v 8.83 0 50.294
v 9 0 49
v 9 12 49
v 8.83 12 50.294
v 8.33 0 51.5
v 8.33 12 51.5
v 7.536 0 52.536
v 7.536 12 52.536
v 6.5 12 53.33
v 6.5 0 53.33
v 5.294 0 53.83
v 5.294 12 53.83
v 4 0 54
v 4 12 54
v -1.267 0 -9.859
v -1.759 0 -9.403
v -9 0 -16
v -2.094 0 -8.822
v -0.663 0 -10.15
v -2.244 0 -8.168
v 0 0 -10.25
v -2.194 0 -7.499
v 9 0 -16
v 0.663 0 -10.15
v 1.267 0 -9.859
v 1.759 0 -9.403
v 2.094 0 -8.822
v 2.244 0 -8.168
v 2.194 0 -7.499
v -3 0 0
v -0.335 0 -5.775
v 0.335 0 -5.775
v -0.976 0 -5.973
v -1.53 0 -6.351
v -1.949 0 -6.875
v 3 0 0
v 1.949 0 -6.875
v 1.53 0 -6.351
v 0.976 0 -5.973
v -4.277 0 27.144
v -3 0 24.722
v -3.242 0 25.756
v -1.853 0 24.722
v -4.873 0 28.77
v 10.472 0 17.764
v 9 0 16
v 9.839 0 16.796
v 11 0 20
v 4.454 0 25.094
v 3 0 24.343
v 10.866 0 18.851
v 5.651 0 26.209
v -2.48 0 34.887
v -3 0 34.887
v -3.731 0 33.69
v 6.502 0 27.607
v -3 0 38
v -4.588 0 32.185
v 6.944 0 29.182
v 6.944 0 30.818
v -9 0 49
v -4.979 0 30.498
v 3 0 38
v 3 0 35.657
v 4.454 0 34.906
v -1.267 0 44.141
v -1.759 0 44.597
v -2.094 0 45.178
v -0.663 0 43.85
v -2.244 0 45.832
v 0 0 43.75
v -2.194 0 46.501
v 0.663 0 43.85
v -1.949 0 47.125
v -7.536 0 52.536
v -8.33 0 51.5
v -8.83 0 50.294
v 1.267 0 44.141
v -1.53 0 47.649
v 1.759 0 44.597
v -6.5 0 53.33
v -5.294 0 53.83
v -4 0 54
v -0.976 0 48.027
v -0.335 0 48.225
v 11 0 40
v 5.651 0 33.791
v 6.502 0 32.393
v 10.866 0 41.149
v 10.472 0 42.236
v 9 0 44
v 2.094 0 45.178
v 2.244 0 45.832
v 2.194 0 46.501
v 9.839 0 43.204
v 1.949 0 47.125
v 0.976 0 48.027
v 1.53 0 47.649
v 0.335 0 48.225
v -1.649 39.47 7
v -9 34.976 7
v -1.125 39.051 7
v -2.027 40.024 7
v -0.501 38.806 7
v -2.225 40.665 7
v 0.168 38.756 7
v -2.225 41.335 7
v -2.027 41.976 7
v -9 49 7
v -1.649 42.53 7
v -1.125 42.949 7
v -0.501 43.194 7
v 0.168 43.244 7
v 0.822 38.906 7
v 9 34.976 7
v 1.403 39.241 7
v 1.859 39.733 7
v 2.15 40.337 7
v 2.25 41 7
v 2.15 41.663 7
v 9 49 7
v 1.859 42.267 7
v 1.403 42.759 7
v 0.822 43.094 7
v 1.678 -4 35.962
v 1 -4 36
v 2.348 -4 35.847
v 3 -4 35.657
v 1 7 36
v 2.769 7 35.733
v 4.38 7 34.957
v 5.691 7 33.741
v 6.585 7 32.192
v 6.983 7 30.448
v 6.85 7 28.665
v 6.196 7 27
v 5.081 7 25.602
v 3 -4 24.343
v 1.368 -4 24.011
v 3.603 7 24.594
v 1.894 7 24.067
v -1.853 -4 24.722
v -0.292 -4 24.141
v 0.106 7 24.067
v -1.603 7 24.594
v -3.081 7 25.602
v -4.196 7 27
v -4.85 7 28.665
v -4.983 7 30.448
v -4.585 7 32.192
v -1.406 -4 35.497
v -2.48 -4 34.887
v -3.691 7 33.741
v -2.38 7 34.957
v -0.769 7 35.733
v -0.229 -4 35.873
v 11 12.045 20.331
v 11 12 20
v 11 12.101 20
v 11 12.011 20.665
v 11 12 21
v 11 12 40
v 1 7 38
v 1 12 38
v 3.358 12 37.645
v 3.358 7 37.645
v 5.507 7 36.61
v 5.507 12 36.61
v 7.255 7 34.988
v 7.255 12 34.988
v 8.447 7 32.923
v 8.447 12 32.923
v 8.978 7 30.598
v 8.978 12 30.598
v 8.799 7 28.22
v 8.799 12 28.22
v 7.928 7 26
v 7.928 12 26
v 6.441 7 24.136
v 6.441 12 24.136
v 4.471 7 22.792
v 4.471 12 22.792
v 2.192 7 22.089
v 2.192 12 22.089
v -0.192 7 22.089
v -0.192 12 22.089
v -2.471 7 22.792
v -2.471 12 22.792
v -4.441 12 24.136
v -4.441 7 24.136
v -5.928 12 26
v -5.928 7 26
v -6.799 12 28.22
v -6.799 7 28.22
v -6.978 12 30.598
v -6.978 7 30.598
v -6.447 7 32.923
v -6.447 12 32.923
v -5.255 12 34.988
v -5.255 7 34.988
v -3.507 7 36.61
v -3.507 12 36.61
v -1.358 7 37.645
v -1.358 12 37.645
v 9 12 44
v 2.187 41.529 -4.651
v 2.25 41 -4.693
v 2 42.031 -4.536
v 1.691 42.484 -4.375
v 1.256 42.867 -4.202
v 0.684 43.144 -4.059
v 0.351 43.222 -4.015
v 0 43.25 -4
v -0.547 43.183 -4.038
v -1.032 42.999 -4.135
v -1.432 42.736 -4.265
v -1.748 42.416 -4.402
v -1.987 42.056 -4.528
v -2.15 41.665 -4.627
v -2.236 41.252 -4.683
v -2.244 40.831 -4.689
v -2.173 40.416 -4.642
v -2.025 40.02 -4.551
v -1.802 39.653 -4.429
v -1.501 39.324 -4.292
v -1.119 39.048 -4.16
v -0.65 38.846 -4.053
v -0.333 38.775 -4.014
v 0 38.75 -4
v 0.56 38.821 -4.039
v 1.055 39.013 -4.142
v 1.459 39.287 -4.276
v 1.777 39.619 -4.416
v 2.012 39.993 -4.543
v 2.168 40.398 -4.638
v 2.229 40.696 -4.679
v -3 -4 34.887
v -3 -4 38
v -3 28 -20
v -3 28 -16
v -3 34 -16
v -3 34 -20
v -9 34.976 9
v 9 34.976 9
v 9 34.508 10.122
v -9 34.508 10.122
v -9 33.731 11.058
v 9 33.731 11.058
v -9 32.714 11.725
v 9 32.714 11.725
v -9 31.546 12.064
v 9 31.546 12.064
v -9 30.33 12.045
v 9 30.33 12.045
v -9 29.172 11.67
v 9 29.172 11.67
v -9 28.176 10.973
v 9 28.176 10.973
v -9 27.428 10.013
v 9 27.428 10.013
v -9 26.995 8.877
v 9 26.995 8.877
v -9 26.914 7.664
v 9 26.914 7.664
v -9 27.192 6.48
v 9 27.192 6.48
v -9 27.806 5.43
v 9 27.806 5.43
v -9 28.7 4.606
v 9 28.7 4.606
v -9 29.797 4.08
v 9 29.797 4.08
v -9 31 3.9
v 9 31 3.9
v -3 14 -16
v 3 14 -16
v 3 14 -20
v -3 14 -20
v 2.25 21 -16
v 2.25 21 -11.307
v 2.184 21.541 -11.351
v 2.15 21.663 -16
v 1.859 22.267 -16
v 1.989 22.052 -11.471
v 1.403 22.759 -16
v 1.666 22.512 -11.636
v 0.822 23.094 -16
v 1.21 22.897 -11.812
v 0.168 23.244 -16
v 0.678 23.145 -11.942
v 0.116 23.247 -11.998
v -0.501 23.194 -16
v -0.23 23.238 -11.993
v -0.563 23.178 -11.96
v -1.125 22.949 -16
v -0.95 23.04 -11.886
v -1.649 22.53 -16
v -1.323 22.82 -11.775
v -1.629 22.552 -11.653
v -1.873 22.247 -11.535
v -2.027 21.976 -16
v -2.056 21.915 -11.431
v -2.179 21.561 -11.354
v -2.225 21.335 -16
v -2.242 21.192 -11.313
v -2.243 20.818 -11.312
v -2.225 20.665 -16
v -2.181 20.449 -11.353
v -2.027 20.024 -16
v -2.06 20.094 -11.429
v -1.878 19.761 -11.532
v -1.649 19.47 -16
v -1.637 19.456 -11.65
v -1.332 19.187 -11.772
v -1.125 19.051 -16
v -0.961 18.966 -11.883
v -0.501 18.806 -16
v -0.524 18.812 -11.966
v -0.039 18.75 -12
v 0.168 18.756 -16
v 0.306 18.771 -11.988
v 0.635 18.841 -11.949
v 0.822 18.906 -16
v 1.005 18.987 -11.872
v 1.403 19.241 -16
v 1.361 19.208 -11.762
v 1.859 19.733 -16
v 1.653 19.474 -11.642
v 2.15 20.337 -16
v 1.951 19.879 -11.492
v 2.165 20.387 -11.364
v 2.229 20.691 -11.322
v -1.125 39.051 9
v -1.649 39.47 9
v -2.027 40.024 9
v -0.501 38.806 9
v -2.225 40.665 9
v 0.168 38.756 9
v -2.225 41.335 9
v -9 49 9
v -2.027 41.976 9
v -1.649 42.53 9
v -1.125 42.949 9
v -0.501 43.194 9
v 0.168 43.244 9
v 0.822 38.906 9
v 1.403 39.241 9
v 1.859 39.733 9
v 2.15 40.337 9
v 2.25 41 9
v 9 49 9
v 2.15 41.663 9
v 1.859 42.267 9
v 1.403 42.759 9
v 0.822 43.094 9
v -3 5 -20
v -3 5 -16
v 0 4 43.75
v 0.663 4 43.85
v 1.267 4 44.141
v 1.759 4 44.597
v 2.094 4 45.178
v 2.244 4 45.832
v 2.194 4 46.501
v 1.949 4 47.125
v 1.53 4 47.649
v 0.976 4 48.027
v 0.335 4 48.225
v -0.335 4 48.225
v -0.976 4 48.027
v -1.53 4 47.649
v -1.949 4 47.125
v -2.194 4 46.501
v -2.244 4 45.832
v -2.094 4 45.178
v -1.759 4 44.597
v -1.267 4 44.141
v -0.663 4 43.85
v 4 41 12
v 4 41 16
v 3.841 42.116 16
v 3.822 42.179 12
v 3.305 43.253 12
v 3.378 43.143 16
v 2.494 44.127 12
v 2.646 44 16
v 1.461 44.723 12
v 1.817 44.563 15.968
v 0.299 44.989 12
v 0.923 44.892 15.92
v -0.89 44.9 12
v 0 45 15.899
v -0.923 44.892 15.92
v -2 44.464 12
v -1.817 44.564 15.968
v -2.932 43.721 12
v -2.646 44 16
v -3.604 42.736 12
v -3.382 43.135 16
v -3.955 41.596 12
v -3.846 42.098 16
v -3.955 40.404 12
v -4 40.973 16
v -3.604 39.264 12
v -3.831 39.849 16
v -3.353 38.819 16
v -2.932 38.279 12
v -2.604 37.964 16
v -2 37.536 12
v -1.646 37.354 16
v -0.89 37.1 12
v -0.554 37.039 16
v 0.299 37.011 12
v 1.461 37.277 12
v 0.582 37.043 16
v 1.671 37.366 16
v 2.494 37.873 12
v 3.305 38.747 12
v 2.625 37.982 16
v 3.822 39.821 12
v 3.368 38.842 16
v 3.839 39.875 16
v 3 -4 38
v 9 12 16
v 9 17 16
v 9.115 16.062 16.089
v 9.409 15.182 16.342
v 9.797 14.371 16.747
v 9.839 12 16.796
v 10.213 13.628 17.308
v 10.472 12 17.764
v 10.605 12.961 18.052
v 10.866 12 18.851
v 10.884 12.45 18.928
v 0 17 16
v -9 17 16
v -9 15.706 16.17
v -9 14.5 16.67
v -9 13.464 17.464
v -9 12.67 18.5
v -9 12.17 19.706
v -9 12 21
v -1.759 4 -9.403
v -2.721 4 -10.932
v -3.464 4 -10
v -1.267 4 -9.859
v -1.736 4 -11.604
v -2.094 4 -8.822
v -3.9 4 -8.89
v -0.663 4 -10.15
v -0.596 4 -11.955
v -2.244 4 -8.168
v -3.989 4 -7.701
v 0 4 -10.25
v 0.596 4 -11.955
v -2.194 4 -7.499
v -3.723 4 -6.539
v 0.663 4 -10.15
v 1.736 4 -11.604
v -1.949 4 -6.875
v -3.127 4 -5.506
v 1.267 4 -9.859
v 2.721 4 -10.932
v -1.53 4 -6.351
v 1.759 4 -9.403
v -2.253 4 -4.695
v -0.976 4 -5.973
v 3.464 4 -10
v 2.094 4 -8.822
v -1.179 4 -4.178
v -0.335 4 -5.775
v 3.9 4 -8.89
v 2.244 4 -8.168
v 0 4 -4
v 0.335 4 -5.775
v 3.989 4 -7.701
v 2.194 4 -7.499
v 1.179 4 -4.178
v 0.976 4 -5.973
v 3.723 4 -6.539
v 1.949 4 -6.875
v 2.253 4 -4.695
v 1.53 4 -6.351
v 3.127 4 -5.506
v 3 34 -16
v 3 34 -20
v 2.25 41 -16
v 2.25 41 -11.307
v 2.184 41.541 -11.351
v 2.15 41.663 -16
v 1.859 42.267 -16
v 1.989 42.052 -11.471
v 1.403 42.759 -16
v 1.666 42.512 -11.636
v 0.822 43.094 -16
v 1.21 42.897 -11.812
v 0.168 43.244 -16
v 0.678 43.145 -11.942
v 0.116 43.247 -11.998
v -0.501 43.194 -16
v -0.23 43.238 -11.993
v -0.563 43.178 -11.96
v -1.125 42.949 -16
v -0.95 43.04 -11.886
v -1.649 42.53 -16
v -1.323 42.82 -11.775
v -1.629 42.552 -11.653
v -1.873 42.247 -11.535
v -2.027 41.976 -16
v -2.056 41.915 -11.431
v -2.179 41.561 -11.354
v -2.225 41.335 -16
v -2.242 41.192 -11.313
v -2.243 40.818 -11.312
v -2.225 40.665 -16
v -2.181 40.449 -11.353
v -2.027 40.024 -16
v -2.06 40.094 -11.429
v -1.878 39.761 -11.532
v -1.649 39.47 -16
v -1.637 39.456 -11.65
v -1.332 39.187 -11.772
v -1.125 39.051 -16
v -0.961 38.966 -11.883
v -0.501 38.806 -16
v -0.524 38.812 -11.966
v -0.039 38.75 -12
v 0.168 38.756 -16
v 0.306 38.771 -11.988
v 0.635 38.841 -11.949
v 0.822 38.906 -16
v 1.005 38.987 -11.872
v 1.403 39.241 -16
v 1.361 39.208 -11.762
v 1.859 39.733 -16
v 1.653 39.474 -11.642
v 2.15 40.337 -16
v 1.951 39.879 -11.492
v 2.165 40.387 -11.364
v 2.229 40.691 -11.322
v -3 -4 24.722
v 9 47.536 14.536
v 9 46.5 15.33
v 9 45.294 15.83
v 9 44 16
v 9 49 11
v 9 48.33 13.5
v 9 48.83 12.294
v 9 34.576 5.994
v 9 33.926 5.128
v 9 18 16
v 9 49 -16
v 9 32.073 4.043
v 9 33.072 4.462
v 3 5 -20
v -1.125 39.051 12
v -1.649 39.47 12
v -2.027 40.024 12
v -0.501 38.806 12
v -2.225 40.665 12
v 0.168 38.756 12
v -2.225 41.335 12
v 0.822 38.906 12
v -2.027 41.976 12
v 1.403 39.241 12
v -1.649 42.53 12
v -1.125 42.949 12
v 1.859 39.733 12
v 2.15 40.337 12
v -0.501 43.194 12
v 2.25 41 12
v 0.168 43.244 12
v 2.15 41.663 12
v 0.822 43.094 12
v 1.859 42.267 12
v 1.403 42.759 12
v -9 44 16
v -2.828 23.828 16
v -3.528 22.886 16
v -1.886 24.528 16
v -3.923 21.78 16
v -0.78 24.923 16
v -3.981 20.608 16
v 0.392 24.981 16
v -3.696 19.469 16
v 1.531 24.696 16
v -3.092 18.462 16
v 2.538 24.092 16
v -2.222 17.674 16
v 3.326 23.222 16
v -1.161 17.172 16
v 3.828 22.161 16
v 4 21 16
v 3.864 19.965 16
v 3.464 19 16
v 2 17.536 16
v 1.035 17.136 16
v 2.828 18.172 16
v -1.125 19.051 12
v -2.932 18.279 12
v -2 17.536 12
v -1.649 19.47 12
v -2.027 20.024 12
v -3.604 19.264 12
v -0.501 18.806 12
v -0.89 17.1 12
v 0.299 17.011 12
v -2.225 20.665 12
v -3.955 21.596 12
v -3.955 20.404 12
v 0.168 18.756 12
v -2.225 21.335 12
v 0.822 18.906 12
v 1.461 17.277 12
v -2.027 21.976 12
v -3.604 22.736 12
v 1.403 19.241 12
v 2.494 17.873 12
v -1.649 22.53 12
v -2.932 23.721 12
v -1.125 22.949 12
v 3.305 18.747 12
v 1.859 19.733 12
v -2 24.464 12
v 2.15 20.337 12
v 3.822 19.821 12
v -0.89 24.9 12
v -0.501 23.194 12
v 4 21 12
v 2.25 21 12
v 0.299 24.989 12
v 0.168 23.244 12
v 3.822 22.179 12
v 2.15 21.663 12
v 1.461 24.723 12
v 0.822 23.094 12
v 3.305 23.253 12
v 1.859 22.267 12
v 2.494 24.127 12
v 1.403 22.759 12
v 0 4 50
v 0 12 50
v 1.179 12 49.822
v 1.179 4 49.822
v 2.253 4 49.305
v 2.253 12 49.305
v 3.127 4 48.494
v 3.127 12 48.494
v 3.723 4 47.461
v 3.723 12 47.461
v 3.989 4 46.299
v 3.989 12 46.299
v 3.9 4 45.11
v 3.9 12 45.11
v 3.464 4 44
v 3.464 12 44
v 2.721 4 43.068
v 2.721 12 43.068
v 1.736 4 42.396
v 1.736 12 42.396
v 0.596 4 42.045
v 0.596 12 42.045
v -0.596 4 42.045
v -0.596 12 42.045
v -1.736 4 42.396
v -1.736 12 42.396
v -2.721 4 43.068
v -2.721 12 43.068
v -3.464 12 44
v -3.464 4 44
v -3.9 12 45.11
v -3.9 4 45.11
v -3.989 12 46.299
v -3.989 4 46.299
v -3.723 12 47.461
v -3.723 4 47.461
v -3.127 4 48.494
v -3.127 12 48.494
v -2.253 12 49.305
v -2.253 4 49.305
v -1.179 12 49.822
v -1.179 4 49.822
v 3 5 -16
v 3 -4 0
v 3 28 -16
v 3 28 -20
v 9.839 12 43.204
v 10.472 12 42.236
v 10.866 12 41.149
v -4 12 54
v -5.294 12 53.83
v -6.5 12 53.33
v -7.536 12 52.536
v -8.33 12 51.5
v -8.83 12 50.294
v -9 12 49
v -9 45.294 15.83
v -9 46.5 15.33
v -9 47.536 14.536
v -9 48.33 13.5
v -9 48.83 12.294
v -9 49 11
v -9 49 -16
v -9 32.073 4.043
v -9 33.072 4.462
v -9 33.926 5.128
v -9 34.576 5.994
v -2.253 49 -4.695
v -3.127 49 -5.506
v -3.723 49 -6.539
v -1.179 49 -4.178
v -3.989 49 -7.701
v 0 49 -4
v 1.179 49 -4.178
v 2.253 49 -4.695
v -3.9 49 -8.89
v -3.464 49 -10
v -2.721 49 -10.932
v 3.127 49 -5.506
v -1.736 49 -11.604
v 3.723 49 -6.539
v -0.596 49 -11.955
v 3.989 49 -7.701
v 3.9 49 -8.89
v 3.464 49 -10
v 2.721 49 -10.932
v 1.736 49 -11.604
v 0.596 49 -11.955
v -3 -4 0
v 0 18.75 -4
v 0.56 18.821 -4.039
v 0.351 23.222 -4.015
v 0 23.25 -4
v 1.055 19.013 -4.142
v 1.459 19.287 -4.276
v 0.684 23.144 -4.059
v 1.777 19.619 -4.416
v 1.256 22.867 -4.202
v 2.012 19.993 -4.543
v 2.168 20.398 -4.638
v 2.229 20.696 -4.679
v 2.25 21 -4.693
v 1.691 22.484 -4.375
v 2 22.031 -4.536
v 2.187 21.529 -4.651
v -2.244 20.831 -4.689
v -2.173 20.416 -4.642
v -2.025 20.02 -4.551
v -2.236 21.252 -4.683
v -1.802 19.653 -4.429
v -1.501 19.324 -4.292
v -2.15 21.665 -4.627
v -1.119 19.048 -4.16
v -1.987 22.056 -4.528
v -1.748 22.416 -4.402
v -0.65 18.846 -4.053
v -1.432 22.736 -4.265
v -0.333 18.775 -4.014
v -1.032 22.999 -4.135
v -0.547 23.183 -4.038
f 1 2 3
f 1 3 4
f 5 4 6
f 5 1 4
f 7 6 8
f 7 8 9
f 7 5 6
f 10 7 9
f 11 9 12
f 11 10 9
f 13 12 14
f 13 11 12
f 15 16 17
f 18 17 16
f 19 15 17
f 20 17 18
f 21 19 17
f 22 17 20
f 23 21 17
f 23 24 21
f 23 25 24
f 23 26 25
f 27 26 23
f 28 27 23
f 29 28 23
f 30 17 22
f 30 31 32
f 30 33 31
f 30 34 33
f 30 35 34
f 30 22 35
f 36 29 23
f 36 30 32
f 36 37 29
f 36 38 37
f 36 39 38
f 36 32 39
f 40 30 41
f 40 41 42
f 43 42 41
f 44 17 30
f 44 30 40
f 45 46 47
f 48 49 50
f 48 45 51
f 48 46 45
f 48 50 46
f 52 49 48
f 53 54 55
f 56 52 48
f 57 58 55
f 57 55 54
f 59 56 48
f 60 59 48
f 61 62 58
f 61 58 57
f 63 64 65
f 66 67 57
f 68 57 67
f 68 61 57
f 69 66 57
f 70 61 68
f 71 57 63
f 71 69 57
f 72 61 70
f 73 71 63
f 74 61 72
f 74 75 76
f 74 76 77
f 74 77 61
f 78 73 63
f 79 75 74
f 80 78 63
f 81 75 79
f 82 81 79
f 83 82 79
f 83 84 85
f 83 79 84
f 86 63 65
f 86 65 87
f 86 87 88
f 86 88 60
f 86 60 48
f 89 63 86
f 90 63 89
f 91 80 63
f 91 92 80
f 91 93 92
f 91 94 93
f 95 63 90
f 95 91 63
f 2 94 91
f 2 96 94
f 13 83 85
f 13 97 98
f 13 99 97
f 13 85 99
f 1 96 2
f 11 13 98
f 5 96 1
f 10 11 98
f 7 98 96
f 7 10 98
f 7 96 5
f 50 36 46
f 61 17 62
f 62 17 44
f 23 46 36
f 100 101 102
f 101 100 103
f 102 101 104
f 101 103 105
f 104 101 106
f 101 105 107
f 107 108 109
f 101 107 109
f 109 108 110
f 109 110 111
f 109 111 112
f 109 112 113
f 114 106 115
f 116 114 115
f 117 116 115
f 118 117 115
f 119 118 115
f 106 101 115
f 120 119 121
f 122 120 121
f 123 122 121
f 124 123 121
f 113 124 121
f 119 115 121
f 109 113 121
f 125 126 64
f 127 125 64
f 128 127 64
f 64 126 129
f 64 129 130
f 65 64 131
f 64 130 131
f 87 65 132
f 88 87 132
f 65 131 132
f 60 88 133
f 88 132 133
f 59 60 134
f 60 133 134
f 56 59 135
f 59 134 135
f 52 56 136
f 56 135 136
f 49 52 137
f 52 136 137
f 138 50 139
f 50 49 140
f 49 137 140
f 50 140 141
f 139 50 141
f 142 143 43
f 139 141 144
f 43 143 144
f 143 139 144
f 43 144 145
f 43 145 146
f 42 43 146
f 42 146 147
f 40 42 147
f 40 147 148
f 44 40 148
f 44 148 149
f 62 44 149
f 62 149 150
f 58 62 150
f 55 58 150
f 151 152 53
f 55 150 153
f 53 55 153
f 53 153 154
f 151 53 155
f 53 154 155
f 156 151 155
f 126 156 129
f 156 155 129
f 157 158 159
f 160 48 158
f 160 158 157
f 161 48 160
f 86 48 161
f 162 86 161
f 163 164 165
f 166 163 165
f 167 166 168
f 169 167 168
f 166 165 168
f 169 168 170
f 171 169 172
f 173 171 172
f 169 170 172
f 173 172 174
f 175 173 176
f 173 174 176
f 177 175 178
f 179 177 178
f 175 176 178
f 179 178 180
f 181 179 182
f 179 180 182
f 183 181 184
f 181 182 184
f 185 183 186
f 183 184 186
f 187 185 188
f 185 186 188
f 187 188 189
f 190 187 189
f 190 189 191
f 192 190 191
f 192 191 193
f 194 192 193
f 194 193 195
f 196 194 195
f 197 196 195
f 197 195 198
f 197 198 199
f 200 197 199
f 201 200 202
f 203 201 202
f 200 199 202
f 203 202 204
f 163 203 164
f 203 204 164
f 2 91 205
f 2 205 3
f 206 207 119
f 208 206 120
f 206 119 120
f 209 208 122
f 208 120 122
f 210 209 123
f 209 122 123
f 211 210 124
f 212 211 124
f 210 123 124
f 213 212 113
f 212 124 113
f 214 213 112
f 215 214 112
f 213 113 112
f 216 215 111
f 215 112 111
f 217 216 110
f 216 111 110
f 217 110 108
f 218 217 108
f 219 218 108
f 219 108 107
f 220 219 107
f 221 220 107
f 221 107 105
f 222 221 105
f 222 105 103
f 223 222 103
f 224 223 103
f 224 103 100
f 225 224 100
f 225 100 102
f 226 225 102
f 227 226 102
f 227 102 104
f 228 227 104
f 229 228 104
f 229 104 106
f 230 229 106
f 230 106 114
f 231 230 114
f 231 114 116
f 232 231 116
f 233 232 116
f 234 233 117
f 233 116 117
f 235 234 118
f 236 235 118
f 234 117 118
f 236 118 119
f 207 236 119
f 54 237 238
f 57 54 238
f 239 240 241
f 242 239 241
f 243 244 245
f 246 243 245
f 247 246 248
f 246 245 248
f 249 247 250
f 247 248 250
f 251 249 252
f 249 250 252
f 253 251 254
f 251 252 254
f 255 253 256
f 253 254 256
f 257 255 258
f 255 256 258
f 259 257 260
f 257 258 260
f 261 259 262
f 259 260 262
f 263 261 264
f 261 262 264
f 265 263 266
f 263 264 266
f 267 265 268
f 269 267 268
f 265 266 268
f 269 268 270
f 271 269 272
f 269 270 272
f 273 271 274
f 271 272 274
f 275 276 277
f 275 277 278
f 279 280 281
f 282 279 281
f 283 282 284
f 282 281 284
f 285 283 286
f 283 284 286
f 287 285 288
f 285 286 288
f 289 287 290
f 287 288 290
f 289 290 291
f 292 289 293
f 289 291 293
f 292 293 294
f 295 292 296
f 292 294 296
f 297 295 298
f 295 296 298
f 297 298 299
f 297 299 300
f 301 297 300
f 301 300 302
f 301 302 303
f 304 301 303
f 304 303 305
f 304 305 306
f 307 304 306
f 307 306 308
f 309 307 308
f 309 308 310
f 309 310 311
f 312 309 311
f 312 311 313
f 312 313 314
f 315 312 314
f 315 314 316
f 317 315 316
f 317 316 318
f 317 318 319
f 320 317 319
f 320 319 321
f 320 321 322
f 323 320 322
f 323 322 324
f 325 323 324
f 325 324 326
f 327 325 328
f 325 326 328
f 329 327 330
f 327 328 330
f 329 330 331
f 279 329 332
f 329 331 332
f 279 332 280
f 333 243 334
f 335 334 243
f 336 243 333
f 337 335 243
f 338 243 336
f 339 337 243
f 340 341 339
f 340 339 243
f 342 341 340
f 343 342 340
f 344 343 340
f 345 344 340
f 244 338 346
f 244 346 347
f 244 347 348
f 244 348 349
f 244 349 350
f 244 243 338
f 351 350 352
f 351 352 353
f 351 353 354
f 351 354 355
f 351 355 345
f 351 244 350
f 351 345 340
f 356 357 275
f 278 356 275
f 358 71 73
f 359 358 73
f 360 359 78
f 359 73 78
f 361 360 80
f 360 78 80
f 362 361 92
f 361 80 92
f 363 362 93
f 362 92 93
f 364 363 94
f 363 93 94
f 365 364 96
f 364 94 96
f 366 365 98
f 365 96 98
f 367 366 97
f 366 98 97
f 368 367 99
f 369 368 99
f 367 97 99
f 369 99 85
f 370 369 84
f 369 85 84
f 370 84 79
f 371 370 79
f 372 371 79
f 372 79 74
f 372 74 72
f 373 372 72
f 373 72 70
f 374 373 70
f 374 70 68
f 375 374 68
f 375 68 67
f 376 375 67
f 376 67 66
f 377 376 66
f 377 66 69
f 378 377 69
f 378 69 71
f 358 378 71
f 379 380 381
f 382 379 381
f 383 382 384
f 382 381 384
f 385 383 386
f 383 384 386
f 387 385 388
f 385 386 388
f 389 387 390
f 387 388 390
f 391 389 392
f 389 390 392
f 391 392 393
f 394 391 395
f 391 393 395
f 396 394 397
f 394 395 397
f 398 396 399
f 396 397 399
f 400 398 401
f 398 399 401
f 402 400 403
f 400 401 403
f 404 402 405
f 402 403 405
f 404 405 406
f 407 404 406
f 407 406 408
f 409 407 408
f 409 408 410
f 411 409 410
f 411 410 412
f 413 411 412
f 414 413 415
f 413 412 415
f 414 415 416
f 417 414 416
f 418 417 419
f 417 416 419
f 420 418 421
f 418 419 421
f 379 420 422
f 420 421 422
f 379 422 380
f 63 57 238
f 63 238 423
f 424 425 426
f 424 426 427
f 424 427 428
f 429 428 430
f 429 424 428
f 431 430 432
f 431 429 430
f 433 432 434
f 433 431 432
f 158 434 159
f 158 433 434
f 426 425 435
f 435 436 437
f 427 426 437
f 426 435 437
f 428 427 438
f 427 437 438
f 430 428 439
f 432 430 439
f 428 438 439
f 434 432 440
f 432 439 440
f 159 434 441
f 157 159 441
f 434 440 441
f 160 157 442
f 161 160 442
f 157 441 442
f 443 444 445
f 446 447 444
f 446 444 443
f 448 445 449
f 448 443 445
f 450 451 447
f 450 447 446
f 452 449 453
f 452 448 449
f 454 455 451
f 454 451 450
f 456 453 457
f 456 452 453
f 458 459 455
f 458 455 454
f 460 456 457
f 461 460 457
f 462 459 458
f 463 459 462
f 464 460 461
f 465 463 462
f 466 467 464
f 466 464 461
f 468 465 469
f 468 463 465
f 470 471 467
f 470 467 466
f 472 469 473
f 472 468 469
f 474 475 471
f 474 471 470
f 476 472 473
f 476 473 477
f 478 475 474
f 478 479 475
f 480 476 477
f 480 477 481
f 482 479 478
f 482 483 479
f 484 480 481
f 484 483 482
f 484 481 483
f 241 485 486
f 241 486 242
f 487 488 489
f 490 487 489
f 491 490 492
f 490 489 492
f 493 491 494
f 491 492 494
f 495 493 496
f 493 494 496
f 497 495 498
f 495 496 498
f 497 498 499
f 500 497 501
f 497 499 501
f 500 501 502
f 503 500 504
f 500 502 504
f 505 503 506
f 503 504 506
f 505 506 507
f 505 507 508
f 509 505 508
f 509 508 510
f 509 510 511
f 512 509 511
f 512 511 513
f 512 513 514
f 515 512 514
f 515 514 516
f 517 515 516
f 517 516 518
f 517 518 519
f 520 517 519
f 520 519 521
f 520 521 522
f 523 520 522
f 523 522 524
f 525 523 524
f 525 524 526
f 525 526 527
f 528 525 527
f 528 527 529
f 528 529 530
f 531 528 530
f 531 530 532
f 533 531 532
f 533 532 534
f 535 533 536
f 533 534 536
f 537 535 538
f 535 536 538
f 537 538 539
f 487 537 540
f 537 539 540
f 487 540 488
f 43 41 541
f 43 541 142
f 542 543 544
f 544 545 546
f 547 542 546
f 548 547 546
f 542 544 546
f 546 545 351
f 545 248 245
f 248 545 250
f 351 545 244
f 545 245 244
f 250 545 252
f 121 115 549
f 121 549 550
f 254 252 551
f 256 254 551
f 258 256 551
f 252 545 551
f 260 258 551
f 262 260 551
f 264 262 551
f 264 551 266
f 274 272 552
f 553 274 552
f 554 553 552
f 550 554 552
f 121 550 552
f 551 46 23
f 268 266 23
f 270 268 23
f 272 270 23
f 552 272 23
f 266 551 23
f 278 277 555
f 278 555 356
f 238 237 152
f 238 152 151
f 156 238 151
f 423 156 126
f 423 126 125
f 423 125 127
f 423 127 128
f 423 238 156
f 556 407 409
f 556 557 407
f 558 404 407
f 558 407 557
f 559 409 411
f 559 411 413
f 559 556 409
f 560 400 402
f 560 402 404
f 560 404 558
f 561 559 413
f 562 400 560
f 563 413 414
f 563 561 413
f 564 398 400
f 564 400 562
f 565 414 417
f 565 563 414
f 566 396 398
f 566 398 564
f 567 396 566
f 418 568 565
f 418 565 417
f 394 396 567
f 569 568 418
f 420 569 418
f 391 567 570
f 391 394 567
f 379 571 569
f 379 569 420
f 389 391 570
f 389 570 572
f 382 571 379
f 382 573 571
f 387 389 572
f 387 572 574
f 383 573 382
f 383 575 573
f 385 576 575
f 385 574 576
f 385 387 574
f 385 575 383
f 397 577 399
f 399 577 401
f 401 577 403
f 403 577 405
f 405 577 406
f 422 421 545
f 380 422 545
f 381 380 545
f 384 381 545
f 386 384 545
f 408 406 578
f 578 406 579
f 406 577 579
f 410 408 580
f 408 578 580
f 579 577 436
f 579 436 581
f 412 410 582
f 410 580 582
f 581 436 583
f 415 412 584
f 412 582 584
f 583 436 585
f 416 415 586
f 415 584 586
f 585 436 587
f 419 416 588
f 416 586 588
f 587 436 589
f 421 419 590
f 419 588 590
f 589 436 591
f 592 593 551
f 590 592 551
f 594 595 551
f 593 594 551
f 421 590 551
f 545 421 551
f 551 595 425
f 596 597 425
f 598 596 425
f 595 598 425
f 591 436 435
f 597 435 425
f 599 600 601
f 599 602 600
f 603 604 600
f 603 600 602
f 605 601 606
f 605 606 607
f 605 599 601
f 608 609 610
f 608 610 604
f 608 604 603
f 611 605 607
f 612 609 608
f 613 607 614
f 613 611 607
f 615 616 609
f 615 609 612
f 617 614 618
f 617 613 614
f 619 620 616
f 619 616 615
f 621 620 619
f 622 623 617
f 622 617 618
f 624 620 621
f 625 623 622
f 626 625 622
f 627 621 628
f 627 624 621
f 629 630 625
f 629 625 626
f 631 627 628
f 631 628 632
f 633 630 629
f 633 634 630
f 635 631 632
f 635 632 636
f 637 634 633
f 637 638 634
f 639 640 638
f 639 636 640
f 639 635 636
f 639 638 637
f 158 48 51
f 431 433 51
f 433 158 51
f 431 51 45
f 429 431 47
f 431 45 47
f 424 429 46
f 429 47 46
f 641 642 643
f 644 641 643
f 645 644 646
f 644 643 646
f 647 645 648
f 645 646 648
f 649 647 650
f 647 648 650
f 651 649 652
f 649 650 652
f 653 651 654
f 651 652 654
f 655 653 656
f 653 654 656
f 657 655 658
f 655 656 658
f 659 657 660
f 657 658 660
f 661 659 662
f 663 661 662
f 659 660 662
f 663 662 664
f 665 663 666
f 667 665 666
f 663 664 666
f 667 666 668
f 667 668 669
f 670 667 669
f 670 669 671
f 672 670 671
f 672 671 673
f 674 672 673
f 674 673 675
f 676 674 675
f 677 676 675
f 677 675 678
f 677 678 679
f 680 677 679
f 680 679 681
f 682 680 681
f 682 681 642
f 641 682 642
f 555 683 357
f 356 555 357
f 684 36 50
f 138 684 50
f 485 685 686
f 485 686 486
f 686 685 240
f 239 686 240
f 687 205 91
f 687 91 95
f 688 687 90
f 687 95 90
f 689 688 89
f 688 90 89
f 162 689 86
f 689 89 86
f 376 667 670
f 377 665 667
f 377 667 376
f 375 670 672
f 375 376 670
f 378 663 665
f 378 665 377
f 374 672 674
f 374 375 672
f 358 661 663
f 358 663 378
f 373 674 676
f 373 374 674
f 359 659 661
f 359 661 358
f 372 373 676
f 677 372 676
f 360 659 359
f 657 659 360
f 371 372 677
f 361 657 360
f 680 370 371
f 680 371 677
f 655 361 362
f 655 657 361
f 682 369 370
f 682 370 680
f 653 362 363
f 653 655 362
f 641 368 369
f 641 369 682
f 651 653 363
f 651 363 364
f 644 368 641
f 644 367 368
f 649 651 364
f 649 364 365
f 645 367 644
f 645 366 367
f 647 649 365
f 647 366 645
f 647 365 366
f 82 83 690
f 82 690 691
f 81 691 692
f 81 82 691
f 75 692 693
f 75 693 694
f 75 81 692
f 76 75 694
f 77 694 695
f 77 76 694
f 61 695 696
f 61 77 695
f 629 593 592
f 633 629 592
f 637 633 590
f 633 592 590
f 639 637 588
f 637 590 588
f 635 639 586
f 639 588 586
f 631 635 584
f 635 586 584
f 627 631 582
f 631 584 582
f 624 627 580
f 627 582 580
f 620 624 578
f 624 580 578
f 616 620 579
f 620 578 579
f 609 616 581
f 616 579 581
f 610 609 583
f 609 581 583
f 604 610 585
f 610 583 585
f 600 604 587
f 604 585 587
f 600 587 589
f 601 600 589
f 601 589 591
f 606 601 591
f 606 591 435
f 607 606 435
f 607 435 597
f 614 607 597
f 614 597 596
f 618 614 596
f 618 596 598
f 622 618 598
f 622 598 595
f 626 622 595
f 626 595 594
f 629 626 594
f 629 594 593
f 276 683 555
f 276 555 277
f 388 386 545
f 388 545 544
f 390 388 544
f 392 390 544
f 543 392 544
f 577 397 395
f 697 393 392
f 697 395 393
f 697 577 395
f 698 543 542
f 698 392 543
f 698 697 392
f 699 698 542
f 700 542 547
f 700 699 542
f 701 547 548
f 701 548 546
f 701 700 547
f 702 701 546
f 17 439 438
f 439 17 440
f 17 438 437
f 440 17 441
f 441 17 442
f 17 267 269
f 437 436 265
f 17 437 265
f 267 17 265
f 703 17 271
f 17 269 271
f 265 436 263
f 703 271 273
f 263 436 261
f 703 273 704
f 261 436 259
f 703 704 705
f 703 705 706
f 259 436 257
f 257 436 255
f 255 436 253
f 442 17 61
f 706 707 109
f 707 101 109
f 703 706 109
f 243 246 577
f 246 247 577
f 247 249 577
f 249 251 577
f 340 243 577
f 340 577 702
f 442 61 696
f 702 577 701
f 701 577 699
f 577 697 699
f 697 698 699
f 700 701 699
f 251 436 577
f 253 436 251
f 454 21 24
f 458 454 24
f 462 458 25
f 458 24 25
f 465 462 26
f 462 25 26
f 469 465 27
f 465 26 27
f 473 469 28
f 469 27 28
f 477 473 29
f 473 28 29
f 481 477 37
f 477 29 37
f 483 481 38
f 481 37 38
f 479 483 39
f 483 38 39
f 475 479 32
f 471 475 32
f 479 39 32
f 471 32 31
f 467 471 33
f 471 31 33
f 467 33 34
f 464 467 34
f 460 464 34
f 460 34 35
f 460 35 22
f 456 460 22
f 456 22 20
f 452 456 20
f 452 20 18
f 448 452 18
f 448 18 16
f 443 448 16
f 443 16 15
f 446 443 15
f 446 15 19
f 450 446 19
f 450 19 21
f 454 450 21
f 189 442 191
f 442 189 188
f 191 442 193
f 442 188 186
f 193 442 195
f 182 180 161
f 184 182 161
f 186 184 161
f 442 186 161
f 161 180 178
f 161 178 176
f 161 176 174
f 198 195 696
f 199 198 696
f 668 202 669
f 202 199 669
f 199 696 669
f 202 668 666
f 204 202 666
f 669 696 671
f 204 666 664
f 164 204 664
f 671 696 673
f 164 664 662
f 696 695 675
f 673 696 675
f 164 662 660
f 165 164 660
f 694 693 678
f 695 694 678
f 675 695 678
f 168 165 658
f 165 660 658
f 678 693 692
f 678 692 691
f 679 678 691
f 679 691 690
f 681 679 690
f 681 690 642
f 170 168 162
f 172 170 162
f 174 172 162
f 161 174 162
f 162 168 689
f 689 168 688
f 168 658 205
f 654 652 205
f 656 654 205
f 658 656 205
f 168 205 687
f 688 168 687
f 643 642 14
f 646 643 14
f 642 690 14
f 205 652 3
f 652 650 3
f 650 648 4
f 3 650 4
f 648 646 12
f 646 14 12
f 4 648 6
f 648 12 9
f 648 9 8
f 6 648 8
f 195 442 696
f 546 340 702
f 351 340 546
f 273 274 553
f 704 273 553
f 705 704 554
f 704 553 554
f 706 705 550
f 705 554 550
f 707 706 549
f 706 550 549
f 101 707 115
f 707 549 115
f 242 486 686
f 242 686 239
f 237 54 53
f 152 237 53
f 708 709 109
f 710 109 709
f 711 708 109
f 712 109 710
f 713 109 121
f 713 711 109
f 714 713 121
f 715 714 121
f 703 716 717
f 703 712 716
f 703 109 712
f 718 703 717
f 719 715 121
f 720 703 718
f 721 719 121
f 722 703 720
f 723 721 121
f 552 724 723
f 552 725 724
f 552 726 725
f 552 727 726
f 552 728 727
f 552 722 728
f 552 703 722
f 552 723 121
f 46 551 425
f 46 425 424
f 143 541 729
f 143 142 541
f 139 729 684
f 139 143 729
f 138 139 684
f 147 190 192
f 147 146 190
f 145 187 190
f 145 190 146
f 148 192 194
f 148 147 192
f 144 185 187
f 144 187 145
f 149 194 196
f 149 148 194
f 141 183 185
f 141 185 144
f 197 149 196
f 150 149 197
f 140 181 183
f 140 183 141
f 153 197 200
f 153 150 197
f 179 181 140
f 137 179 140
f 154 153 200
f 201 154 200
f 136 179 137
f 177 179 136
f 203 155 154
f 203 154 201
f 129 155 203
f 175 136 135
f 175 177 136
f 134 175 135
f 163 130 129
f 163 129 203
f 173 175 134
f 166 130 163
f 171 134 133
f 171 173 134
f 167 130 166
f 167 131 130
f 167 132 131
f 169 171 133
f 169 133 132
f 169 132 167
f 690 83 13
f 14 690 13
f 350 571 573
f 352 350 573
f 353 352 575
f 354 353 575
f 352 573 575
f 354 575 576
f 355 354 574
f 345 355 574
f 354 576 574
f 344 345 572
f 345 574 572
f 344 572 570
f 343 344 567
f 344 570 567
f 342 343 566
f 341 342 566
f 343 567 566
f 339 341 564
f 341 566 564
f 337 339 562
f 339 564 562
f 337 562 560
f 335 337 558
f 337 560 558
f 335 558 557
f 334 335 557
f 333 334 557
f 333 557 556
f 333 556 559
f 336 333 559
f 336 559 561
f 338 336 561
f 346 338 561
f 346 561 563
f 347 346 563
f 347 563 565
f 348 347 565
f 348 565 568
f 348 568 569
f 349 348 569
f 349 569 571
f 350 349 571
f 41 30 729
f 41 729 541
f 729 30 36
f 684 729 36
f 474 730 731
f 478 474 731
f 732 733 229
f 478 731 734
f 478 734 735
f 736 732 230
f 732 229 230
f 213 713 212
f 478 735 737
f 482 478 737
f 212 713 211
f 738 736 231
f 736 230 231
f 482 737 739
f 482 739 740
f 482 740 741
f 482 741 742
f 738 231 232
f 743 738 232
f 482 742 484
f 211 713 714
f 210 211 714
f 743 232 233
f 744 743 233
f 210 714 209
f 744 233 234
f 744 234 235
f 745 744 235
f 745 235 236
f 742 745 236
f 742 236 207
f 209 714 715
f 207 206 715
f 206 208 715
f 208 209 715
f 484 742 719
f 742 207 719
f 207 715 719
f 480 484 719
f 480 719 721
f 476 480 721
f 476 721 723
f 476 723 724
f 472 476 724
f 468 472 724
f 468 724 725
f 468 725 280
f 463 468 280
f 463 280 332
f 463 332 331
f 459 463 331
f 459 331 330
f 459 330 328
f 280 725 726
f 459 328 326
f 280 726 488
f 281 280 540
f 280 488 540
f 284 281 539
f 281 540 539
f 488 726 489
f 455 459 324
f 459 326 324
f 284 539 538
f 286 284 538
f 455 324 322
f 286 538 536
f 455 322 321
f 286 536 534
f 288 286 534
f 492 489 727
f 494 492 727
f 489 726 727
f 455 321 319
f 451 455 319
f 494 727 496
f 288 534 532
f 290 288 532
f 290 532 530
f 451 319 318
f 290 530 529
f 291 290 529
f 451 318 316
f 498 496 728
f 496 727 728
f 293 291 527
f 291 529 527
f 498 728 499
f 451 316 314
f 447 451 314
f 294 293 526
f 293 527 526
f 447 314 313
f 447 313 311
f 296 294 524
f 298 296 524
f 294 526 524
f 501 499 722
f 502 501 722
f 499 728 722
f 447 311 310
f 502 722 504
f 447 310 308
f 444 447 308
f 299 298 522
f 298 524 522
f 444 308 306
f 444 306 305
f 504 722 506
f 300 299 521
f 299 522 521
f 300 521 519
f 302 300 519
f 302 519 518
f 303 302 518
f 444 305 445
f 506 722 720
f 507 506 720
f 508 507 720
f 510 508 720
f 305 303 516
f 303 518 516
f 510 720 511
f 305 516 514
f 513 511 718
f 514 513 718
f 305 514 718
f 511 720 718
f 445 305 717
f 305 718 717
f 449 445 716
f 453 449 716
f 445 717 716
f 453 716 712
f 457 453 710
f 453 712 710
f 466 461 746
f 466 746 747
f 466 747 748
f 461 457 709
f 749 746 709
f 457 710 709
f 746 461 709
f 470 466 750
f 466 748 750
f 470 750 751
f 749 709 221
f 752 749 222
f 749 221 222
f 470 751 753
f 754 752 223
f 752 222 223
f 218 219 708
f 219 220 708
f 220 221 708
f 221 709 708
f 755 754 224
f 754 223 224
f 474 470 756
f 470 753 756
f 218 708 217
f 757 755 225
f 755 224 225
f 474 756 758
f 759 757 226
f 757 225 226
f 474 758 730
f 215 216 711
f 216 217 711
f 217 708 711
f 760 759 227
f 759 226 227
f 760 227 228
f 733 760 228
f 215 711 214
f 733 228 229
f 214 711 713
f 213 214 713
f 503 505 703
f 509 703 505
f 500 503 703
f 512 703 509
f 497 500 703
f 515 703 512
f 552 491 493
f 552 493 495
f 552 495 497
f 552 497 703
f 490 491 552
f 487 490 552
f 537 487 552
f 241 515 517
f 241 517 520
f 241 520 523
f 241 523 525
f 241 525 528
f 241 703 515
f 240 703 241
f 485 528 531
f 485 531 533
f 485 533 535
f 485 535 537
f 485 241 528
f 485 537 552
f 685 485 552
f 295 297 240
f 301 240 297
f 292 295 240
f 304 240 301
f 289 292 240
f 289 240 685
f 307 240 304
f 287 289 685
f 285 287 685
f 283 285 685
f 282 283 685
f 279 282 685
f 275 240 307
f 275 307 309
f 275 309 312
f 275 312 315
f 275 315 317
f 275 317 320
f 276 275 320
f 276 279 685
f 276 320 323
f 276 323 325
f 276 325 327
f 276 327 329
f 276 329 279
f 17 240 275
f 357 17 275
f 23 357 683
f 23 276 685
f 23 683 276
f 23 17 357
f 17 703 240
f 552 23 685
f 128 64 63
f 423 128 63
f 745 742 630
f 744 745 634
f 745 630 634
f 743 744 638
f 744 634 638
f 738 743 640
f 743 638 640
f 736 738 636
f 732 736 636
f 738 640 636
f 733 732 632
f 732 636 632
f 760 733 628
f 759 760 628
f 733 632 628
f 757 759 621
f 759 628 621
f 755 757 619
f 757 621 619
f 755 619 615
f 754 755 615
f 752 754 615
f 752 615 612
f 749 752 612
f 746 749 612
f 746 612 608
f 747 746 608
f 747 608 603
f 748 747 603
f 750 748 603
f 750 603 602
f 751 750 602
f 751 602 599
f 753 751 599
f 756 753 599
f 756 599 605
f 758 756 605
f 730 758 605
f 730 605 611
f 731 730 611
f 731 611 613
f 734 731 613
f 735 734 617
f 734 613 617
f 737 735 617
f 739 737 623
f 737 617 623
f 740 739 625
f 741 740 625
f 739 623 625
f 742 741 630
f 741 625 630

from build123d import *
from build123d.topology import SkipClean

# Parameters (mm, degrees)
SKETCH_2_W          = 18
SKETCH_2_H          = 32
EXTRUDE_1_DEPTH     = 49
SKETCH_3_R          = 4.1
CUT_EXTRUDE_1_DEPTH = 27.3
SKETCH_16_W         = 20
SKETCH_16_H         = 28
EXTRUDE_3_DEPTH     = 12
SKETCH_17_R         = 2.25
CUT_EXTRUDE_3_DEPTH = 66
SKETCH_18_W         = 6
SKETCH_18_H         = 9
SKETCH_18_H_2       = 6
EXTRUDE_4_DEPTH     = 4
SKETCH_19_R         = 4
CUT_EXTRUDE_4_DEPTH = 4
SKETCH_23_W         = 18
SKETCH_23_H         = 10
EXTRUDE_5_DEPTH     = 12
SKETCH_4_R          = 2.25
CUT_EXTRUDE_2_DEPTH = 74.742796258
SKETCH_20_R         = 8
SKETCH_20_R_2       = 6
CUT_EXTRUDE_5_DEPTH = 5
SKETCH_8_W          = 6
SKETCH_8_H          = 3.112620607
SKETCH_8_H_2        = 24.721686793
EXTRUDE_7_DEPTH     = 4
SKETCH_20_4_R       = 6
CUT_EXTRUDE_7_DEPTH = 25
FILLET_1_R          = 5
FILLET_START        = -1
FILLET_2_DEPTH      = 13
FILLET_START_2      = -9
FILLET_2_2_DEPTH    = 18.34805991
FILLET_2_3_DEPTH    = 20
FILLET_2_4_DEPTH    = 19
SKETCH_24_W         = 2
SKETCH_24_H         = 18
CUT_EXTRUDE_8_DEPTH = 23
SKETCH_25_R         = 4
CUT_EXTRUDE_9_DEPTH = 45


with BuildPart() as part:
    # Эскиз2 → Бобышка-Вытянуть1 (new body)
    with BuildSketch(Plane(origin=(0, 0, 0), x_dir=(1, 0, 0), z_dir=(0, 1, 0))):
        Rectangle(SKETCH_2_W, SKETCH_2_H)
    extrude(amount=EXTRUDE_1_DEPTH)

    # Эскиз3 → Вырез-Вытянуть1 (cut)
    with BuildSketch(Plane(origin=(9, 0, -3.279463983), x_dir=(0, 0, -1), z_dir=(1, 0, 0))):
        with Locations((-11.279463983, 31)):
            Circle(SKETCH_3_R)
    extrude(amount=-CUT_EXTRUDE_1_DEPTH, mode=Mode.SUBTRACT)

    # Эскиз16 → Бобышка-Вытянуть3 (add)
    with BuildSketch(Plane.XZ):
        with Locations((1, 30)):
            Rectangle(SKETCH_16_W, SKETCH_16_H)
    extrude(amount=-EXTRUDE_3_DEPTH)

    # Эскиз17 → Вырез-Вытянуть3 (cut)
    with BuildSketch(Plane.XY.offset(16)):
        with Locations((0, 41)):
            Circle(SKETCH_17_R)
        with Locations((0, 21)):
            Circle(SKETCH_17_R)
    extrude(amount=-CUT_EXTRUDE_3_DEPTH, mode=Mode.SUBTRACT)

    # Эскиз18 → Бобышка-Вытянуть4 (add)
    with BuildSketch(Plane(origin=(0, 0, -16), x_dir=(-1, 0, 0), z_dir=(0, 0, -1))):
        with Locations((0, 9.5)):
            Rectangle(SKETCH_18_W, SKETCH_18_H)
        with Locations((0, 31)):
            Rectangle(SKETCH_18_W, SKETCH_18_H_2)
    extrude(amount=EXTRUDE_4_DEPTH)

    # Эскиз19 → Вырез-Вытянуть4 (cut)
    with BuildSketch(Plane.XY.offset(16)):
        with Locations((0, 21)):
            Circle(SKETCH_19_R)
        with Locations((0, 41)):
            Circle(SKETCH_19_R)
    extrude(amount=-CUT_EXTRUDE_4_DEPTH, mode=Mode.SUBTRACT)

    # Эскиз23 → Бобышка-Вытянуть5 (add)
    with BuildSketch(Plane.XZ):
        with Locations((0, 49)):
            Rectangle(SKETCH_23_W, SKETCH_23_H)
    extrude(amount=-EXTRUDE_5_DEPTH)

    # Эскиз4 → Вырез-Вытянуть2 (cut, through all)
    with BuildSketch(Plane.XZ):
        with Locations(Location((0, 46, 0), (0, 0, 270))):
            Circle(SKETCH_4_R)
        with Locations(Location((0, -8, 0), (0, 0, 270))):
            Circle(SKETCH_4_R)
    extrude(amount=-CUT_EXTRUDE_2_DEPTH, mode=Mode.SUBTRACT)

    # Эскиз20 → Вырез-Вытянуть5 (cut)
    with BuildSketch(Plane(origin=(0, 12, 0), x_dir=(1, 0, 0), z_dir=(0, 1, 0))):
        with Locations(Location((1, -30, 0), (0, 0, 270))):
            Circle(SKETCH_20_R)
        with Locations(Location((1, -30, 0), (0, 0, 270))):
            Circle(SKETCH_20_R_2, mode=Mode.SUBTRACT)
    extrude(amount=-CUT_EXTRUDE_5_DEPTH, mode=Mode.SUBTRACT)

    # Эскиз8 → Бобышка-Вытянуть7 (add)
    with BuildSketch(Plane.XZ):
        with Locations((0, 36.443689697)):
            Rectangle(SKETCH_8_W, SKETCH_8_H)
        with Locations((0, 12.360843396)):
            Rectangle(SKETCH_8_W, SKETCH_8_H_2)
    extrude(amount=EXTRUDE_7_DEPTH)

    # Эскиз20<4> → Вырез-Вытянуть7 (cut)
    with BuildSketch(Plane(origin=(0, 12, 0), x_dir=(1, 0, 0), z_dir=(0, 1, 0))):
        with Locations(Location((1, -30, 0), (0, 0, 270))):
            Circle(SKETCH_20_4_R)
    extrude(amount=-CUT_EXTRUDE_7_DEPTH, mode=Mode.SUBTRACT)

    # Скругление1
    # the kernel refuses this fillet: 5 mm, written as the material it takes off along each edge
    with BuildSketch(Plane(origin=(11, -10, 44), x_dir=(0, 0, -1), z_dir=(0, 1, 0))) as fillet_1_piece_1:
        with BuildLine():
            CenterArc((4, 5), FILLET_1_R, 216.869897646, 53.130102354)
            Line((0, 2), (-0.08, 1.94))
            ThreePointArc((-0.08, 1.94), (-0.1, 1), (-0.1, 0))
            Line((-0.1, 0), (0, -0.1))
            Line((0, -0.1), (4, -0.1))
            Line((4, -0.1), (4, 0))
        make_face()
    extrude(amount=32, mode=Mode.SUBTRACT)
    with BuildSketch(Plane(origin=(11, -10, 16), x_dir=(-1, 0, 0), z_dir=(0, 1, 0))) as fillet_1_piece_2:
        with BuildLine():
            CenterArc((5, 4), FILLET_1_R, 180, 53.130102354)
            Line((0, 4), (-0.1, 4))
            Line((-0.1, 4), (-0.1, 0))
            Line((-0.1, 0), (0, -0.1))
            ThreePointArc((0, -0.1), (1, -0.1), (1.94, -0.08))
            Line((1.94, -0.08), (2, 0))
        make_face()
    extrude(amount=32, mode=Mode.SUBTRACT)

    # Скругление2: read off the stored shape, not the designer's step
    # Скругление2 outline → Скругление2 (cut)
    with BuildSketch(Plane(origin=(0, 0, 0), x_dir=(1, 0, 0), z_dir=(0, 1, 0)).offset(FILLET_START)):
        with BuildLine():
            Line((9, -54), (9, -49))
            ThreePointArc((9, -49), (7.535533906, -52.535533906), (4, -54))
            Line((4, -54), (9, -54))
        make_face()
    extrude(amount=FILLET_2_DEPTH, mode=Mode.SUBTRACT)

    # Fillet 2 2 outline → Fillet 2 2 (cut)
    with BuildSketch(Plane.YZ.offset(FILLET_START_2)):
        with BuildLine():
            Line((49, 16), (44, 16))
            ThreePointArc((44, 16), (47.535533906, 14.535533906), (49, 11))
            Line((49, 11), (49, 16))
        make_face()
    extrude(amount=FILLET_2_2_DEPTH, mode=Mode.SUBTRACT)

    # Fillet 2 3 outline → Fillet 2 3 (add)
    with BuildSketch(Plane.YZ.offset(FILLET_START_2)):
        with BuildLine():
            Line((12, 16), (17, 16))
            ThreePointArc((17, 16), (13.464466094, 17.464466094), (12, 21))
            Line((12, 21), (12, 16))
        make_face()
    extrude(amount=FILLET_2_3_DEPTH)

    # Fillet 2 4 outline → Fillet 2 4 (cut)
    with SkipClean():  # the faces are left unmerged after this step: merging them gives an invalid solid
        with BuildSketch(Plane(origin=(0, 0, 0), x_dir=(1, 0, 0), z_dir=(0, 1, 0)).offset(FILLET_START)):
            with BuildLine():
                ThreePointArc((8.999983996, -15.999987997), (10.472131482, -17.763923076), (11, -20))
                Line((11, -20), (11, -16))
                Line((11, -16), (8.999983996, -15.999987997))
            make_face()
            with BuildLine():
                ThreePointArc((-4, -54), (-7.535533906, -52.535533906), (-9, -49))
                Line((-9, -49), (-9, -54))
                Line((-9, -54), (-4, -54))
            make_face()
        extrude(amount=FILLET_2_4_DEPTH, mode=Mode.SUBTRACT)

    # Эскиз24 → Вырез-Вытянуть8 (cut)
    with SkipClean():  # the faces are left unmerged after this step: merging them gives an invalid solid
        with BuildSketch(Plane(origin=(9, 0, 0), x_dir=(0, 0, -1), z_dir=(1, 0, 0))):
            with Locations((-8, 40)):
                Rectangle(SKETCH_24_W, SKETCH_24_H)
        extrude(amount=-CUT_EXTRUDE_8_DEPTH, mode=Mode.SUBTRACT)

    # Эскиз25 → Вырез-Вытянуть9 (cut)
    with SkipClean():  # the faces are left unmerged after this step: merging them gives an invalid solid
        with BuildSketch(Plane(origin=(0, 49, 0), x_dir=(1, 0, 0), z_dir=(0, 1, 0))):
            with Locations(Location((0, 8, 0), (0, 0, 270))):
                Circle(SKETCH_25_R)
            with Locations(Location((0, -46, 0), (0, 0, 270))):
                Circle(SKETCH_25_R)
        extrude(amount=-CUT_EXTRUDE_9_DEPTH, mode=Mode.SUBTRACT)


solid = part.part
